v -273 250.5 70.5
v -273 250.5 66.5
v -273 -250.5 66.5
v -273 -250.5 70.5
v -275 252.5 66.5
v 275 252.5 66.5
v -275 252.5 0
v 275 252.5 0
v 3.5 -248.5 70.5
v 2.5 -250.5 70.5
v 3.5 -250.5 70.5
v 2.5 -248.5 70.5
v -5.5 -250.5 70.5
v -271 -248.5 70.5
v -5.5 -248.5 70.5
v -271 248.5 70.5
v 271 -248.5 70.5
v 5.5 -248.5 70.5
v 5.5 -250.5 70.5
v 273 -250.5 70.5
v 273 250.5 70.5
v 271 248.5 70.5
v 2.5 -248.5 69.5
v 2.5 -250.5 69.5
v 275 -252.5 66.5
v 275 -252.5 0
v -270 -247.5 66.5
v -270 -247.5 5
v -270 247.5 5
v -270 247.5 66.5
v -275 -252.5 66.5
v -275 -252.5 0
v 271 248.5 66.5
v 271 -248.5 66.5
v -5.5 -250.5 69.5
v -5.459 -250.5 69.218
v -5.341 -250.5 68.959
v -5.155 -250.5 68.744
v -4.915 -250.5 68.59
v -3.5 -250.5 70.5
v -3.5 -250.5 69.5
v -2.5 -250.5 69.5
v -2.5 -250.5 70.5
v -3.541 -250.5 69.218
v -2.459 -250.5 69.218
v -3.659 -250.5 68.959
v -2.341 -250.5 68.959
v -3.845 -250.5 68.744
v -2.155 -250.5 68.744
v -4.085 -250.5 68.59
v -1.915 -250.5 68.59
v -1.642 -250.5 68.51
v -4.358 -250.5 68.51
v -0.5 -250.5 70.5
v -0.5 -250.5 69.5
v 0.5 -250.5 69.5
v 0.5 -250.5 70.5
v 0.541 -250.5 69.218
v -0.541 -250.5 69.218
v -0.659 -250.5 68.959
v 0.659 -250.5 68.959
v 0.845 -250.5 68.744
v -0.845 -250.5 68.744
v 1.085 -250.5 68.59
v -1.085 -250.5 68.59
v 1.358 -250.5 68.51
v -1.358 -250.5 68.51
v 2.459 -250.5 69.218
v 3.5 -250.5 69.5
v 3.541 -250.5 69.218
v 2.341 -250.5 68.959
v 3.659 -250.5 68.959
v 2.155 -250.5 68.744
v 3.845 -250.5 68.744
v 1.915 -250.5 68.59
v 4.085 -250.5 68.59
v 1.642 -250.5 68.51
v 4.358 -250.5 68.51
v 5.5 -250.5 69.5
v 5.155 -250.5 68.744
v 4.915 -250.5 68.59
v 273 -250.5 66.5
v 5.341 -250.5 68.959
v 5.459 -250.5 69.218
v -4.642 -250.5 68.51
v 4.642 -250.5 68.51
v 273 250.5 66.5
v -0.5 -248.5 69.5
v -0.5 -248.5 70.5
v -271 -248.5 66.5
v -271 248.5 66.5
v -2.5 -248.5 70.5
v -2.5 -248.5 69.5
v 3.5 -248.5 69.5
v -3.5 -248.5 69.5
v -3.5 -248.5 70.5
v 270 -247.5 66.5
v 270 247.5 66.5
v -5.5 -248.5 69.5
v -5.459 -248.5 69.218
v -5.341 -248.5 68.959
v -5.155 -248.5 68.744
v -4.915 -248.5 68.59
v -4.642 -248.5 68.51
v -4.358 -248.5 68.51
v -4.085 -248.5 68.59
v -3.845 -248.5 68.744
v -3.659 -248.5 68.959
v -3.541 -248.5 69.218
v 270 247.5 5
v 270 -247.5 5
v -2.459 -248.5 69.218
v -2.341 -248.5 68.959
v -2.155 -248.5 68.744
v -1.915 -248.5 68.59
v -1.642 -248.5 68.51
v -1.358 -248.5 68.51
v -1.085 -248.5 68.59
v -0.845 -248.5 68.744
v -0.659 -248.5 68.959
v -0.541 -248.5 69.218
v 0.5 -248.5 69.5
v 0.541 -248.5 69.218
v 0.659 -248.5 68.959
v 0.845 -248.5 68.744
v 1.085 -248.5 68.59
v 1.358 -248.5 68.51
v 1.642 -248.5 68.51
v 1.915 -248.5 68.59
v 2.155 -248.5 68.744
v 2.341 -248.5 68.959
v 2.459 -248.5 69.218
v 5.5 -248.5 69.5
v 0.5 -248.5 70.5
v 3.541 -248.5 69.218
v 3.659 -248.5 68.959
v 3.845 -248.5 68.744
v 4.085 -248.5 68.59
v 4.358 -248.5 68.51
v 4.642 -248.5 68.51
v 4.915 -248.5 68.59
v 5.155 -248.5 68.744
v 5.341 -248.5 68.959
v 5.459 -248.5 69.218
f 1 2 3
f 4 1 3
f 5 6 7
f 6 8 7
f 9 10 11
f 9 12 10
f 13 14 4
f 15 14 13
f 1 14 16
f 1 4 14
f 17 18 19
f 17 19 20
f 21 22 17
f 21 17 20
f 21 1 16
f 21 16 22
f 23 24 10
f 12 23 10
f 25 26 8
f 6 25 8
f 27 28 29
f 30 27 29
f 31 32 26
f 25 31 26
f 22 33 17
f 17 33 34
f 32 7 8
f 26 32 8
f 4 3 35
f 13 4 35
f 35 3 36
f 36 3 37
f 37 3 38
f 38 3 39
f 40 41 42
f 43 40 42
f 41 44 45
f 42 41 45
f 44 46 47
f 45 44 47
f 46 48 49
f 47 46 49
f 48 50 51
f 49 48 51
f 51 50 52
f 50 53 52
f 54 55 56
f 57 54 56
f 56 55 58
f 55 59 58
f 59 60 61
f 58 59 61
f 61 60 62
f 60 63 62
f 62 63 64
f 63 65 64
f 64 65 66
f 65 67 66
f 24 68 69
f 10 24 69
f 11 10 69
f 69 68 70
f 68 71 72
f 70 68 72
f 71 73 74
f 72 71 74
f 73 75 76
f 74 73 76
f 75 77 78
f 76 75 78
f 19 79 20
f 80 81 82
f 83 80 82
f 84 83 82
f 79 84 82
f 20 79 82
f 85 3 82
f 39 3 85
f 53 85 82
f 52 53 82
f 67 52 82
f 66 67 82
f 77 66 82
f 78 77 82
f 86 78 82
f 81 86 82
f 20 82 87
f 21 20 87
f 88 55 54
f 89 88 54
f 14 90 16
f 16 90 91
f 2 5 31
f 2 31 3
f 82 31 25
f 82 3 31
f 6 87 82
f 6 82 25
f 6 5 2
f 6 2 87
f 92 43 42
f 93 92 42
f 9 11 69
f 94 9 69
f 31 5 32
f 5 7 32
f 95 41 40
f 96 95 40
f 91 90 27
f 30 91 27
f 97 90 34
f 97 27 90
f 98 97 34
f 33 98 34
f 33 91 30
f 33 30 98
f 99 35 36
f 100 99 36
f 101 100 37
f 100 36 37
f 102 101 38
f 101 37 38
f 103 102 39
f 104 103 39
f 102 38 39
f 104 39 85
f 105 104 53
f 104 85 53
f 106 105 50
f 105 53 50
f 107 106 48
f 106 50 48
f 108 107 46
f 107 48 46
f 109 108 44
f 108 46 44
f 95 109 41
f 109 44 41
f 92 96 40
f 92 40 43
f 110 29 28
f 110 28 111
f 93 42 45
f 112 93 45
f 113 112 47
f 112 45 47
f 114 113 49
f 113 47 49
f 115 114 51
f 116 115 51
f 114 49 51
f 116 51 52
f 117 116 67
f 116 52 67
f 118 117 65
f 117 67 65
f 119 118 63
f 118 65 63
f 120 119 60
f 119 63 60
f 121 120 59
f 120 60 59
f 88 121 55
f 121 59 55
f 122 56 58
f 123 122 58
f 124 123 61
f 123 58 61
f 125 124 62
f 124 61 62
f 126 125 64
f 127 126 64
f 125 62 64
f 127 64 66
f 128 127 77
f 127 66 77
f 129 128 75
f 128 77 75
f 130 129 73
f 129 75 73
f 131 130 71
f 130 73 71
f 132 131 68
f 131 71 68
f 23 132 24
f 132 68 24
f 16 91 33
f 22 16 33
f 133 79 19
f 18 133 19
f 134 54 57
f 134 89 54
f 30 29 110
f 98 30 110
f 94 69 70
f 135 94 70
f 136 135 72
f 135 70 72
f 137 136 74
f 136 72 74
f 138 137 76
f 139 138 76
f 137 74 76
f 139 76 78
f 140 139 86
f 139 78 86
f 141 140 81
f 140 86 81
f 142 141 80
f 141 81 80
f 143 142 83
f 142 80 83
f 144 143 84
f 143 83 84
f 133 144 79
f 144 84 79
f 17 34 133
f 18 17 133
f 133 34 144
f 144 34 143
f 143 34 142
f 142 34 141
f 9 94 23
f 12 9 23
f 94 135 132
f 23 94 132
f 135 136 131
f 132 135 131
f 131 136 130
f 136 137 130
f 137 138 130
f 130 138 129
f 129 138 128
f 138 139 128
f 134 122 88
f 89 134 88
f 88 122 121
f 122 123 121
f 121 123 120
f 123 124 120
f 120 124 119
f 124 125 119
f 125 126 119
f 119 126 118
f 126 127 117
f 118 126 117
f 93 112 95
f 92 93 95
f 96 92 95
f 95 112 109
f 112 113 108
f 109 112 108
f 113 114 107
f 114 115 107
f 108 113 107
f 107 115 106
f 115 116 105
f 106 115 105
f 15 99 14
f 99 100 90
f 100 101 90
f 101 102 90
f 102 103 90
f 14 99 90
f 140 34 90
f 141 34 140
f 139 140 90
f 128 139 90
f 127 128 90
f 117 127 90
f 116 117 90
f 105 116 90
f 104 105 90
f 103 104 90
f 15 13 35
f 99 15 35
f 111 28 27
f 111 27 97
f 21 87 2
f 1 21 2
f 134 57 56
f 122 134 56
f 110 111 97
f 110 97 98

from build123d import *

# Parameters (mm, degrees)
F0_W     = 550
F0_H     = 505
F1_DEPTH = 5
F2_W     = 540
F2_H     = 495
F3_DEPTH = 61.5
F5_DEPTH = 4
F7_DEPTH = 25.4


with BuildPart() as f1:
    # F0 (on Top) → F1 (new body)
    with BuildSketch(Plane.XY):
        Rectangle(F0_W, F0_H)
    extrude(amount=F1_DEPTH)

    # F2 (on face) → F3 (join)
    with BuildSketch(Plane.XY.offset(5)):
        Polygon((-270, -252.5), (275, -252.5), (275, 247.5), (275, 252.5), (270, 252.5), (-275, 252.5), (-275, -247.5), (-275, -252.5), align=None)
        Rectangle(F2_W, F2_H, mode=Mode.SUBTRACT)
    extrude(amount=F3_DEPTH)

    # F4 (on face) → F5 (join)
    with BuildSketch(Plane.XY.offset(66.5)):
        Polygon((273, 250.5), (271, 250.5), (-273, 250.5), (-273, -248.5), (-273, -250.5), (273, -250.5), (273, 248.5), align=None)
        Polygon((-271, -248.5), (-271, -247.5), (-271, 248.5), (270, 248.5), (271, 248.5), (271, 247.5), (271, -248.5), (-270, -248.5), align=None, mode=Mode.SUBTRACT)
    extrude(amount=F5_DEPTH)

    # F6 (on face) → F7 (cut)
    with BuildSketch(Plane.XZ.offset(250.5)):
        with BuildLine():
            Line((4.5, 70.5), (3.5, 70.5))
            Line((3.5, 70.5), (3.5, 69.5))
            ThreePointArc((3.5, 69.5), (4.5, 68.5), (5.5, 69.5))
            Line((5.5, 69.5), (5.5, 70.5))
            Line((5.5, 70.5), (4.5, 70.5))
        make_face()
        with BuildLine():
            Line((1.5, 70.5), (0.5, 70.5))
            Line((0.5, 70.5), (0.5, 69.5))
            ThreePointArc((0.5, 69.5), (1.5, 68.5), (2.5, 69.5))
            Line((2.5, 69.5), (2.5, 70.5))
            Line((2.5, 70.5), (1.5, 70.5))
        make_face()
        with BuildLine():
            Line((-3.5, 69.5), (-3.5, 70.5))
            Line((-3.5, 70.5), (-4.5, 70.5))
            Line((-4.5, 70.5), (-5.5, 70.5))
            Line((-5.5, 70.5), (-5.5, 69.5))
            ThreePointArc((-5.5, 69.5), (-4.5, 68.5), (-3.5, 69.5))
        make_face()
        with BuildLine():
            Line((-0.5, 69.5), (-0.5, 70.5))
            Line((-0.5, 70.5), (-1.5, 70.5))
            Line((-1.5, 70.5), (-2.5, 70.5))
            Line((-2.5, 70.5), (-2.5, 69.5))
            ThreePointArc((-2.5, 69.5), (-1.5, 68.5), (-0.5, 69.5))
        make_face()
    extrude(amount=-F7_DEPTH, mode=Mode.SUBTRACT)


solid = f1.part
